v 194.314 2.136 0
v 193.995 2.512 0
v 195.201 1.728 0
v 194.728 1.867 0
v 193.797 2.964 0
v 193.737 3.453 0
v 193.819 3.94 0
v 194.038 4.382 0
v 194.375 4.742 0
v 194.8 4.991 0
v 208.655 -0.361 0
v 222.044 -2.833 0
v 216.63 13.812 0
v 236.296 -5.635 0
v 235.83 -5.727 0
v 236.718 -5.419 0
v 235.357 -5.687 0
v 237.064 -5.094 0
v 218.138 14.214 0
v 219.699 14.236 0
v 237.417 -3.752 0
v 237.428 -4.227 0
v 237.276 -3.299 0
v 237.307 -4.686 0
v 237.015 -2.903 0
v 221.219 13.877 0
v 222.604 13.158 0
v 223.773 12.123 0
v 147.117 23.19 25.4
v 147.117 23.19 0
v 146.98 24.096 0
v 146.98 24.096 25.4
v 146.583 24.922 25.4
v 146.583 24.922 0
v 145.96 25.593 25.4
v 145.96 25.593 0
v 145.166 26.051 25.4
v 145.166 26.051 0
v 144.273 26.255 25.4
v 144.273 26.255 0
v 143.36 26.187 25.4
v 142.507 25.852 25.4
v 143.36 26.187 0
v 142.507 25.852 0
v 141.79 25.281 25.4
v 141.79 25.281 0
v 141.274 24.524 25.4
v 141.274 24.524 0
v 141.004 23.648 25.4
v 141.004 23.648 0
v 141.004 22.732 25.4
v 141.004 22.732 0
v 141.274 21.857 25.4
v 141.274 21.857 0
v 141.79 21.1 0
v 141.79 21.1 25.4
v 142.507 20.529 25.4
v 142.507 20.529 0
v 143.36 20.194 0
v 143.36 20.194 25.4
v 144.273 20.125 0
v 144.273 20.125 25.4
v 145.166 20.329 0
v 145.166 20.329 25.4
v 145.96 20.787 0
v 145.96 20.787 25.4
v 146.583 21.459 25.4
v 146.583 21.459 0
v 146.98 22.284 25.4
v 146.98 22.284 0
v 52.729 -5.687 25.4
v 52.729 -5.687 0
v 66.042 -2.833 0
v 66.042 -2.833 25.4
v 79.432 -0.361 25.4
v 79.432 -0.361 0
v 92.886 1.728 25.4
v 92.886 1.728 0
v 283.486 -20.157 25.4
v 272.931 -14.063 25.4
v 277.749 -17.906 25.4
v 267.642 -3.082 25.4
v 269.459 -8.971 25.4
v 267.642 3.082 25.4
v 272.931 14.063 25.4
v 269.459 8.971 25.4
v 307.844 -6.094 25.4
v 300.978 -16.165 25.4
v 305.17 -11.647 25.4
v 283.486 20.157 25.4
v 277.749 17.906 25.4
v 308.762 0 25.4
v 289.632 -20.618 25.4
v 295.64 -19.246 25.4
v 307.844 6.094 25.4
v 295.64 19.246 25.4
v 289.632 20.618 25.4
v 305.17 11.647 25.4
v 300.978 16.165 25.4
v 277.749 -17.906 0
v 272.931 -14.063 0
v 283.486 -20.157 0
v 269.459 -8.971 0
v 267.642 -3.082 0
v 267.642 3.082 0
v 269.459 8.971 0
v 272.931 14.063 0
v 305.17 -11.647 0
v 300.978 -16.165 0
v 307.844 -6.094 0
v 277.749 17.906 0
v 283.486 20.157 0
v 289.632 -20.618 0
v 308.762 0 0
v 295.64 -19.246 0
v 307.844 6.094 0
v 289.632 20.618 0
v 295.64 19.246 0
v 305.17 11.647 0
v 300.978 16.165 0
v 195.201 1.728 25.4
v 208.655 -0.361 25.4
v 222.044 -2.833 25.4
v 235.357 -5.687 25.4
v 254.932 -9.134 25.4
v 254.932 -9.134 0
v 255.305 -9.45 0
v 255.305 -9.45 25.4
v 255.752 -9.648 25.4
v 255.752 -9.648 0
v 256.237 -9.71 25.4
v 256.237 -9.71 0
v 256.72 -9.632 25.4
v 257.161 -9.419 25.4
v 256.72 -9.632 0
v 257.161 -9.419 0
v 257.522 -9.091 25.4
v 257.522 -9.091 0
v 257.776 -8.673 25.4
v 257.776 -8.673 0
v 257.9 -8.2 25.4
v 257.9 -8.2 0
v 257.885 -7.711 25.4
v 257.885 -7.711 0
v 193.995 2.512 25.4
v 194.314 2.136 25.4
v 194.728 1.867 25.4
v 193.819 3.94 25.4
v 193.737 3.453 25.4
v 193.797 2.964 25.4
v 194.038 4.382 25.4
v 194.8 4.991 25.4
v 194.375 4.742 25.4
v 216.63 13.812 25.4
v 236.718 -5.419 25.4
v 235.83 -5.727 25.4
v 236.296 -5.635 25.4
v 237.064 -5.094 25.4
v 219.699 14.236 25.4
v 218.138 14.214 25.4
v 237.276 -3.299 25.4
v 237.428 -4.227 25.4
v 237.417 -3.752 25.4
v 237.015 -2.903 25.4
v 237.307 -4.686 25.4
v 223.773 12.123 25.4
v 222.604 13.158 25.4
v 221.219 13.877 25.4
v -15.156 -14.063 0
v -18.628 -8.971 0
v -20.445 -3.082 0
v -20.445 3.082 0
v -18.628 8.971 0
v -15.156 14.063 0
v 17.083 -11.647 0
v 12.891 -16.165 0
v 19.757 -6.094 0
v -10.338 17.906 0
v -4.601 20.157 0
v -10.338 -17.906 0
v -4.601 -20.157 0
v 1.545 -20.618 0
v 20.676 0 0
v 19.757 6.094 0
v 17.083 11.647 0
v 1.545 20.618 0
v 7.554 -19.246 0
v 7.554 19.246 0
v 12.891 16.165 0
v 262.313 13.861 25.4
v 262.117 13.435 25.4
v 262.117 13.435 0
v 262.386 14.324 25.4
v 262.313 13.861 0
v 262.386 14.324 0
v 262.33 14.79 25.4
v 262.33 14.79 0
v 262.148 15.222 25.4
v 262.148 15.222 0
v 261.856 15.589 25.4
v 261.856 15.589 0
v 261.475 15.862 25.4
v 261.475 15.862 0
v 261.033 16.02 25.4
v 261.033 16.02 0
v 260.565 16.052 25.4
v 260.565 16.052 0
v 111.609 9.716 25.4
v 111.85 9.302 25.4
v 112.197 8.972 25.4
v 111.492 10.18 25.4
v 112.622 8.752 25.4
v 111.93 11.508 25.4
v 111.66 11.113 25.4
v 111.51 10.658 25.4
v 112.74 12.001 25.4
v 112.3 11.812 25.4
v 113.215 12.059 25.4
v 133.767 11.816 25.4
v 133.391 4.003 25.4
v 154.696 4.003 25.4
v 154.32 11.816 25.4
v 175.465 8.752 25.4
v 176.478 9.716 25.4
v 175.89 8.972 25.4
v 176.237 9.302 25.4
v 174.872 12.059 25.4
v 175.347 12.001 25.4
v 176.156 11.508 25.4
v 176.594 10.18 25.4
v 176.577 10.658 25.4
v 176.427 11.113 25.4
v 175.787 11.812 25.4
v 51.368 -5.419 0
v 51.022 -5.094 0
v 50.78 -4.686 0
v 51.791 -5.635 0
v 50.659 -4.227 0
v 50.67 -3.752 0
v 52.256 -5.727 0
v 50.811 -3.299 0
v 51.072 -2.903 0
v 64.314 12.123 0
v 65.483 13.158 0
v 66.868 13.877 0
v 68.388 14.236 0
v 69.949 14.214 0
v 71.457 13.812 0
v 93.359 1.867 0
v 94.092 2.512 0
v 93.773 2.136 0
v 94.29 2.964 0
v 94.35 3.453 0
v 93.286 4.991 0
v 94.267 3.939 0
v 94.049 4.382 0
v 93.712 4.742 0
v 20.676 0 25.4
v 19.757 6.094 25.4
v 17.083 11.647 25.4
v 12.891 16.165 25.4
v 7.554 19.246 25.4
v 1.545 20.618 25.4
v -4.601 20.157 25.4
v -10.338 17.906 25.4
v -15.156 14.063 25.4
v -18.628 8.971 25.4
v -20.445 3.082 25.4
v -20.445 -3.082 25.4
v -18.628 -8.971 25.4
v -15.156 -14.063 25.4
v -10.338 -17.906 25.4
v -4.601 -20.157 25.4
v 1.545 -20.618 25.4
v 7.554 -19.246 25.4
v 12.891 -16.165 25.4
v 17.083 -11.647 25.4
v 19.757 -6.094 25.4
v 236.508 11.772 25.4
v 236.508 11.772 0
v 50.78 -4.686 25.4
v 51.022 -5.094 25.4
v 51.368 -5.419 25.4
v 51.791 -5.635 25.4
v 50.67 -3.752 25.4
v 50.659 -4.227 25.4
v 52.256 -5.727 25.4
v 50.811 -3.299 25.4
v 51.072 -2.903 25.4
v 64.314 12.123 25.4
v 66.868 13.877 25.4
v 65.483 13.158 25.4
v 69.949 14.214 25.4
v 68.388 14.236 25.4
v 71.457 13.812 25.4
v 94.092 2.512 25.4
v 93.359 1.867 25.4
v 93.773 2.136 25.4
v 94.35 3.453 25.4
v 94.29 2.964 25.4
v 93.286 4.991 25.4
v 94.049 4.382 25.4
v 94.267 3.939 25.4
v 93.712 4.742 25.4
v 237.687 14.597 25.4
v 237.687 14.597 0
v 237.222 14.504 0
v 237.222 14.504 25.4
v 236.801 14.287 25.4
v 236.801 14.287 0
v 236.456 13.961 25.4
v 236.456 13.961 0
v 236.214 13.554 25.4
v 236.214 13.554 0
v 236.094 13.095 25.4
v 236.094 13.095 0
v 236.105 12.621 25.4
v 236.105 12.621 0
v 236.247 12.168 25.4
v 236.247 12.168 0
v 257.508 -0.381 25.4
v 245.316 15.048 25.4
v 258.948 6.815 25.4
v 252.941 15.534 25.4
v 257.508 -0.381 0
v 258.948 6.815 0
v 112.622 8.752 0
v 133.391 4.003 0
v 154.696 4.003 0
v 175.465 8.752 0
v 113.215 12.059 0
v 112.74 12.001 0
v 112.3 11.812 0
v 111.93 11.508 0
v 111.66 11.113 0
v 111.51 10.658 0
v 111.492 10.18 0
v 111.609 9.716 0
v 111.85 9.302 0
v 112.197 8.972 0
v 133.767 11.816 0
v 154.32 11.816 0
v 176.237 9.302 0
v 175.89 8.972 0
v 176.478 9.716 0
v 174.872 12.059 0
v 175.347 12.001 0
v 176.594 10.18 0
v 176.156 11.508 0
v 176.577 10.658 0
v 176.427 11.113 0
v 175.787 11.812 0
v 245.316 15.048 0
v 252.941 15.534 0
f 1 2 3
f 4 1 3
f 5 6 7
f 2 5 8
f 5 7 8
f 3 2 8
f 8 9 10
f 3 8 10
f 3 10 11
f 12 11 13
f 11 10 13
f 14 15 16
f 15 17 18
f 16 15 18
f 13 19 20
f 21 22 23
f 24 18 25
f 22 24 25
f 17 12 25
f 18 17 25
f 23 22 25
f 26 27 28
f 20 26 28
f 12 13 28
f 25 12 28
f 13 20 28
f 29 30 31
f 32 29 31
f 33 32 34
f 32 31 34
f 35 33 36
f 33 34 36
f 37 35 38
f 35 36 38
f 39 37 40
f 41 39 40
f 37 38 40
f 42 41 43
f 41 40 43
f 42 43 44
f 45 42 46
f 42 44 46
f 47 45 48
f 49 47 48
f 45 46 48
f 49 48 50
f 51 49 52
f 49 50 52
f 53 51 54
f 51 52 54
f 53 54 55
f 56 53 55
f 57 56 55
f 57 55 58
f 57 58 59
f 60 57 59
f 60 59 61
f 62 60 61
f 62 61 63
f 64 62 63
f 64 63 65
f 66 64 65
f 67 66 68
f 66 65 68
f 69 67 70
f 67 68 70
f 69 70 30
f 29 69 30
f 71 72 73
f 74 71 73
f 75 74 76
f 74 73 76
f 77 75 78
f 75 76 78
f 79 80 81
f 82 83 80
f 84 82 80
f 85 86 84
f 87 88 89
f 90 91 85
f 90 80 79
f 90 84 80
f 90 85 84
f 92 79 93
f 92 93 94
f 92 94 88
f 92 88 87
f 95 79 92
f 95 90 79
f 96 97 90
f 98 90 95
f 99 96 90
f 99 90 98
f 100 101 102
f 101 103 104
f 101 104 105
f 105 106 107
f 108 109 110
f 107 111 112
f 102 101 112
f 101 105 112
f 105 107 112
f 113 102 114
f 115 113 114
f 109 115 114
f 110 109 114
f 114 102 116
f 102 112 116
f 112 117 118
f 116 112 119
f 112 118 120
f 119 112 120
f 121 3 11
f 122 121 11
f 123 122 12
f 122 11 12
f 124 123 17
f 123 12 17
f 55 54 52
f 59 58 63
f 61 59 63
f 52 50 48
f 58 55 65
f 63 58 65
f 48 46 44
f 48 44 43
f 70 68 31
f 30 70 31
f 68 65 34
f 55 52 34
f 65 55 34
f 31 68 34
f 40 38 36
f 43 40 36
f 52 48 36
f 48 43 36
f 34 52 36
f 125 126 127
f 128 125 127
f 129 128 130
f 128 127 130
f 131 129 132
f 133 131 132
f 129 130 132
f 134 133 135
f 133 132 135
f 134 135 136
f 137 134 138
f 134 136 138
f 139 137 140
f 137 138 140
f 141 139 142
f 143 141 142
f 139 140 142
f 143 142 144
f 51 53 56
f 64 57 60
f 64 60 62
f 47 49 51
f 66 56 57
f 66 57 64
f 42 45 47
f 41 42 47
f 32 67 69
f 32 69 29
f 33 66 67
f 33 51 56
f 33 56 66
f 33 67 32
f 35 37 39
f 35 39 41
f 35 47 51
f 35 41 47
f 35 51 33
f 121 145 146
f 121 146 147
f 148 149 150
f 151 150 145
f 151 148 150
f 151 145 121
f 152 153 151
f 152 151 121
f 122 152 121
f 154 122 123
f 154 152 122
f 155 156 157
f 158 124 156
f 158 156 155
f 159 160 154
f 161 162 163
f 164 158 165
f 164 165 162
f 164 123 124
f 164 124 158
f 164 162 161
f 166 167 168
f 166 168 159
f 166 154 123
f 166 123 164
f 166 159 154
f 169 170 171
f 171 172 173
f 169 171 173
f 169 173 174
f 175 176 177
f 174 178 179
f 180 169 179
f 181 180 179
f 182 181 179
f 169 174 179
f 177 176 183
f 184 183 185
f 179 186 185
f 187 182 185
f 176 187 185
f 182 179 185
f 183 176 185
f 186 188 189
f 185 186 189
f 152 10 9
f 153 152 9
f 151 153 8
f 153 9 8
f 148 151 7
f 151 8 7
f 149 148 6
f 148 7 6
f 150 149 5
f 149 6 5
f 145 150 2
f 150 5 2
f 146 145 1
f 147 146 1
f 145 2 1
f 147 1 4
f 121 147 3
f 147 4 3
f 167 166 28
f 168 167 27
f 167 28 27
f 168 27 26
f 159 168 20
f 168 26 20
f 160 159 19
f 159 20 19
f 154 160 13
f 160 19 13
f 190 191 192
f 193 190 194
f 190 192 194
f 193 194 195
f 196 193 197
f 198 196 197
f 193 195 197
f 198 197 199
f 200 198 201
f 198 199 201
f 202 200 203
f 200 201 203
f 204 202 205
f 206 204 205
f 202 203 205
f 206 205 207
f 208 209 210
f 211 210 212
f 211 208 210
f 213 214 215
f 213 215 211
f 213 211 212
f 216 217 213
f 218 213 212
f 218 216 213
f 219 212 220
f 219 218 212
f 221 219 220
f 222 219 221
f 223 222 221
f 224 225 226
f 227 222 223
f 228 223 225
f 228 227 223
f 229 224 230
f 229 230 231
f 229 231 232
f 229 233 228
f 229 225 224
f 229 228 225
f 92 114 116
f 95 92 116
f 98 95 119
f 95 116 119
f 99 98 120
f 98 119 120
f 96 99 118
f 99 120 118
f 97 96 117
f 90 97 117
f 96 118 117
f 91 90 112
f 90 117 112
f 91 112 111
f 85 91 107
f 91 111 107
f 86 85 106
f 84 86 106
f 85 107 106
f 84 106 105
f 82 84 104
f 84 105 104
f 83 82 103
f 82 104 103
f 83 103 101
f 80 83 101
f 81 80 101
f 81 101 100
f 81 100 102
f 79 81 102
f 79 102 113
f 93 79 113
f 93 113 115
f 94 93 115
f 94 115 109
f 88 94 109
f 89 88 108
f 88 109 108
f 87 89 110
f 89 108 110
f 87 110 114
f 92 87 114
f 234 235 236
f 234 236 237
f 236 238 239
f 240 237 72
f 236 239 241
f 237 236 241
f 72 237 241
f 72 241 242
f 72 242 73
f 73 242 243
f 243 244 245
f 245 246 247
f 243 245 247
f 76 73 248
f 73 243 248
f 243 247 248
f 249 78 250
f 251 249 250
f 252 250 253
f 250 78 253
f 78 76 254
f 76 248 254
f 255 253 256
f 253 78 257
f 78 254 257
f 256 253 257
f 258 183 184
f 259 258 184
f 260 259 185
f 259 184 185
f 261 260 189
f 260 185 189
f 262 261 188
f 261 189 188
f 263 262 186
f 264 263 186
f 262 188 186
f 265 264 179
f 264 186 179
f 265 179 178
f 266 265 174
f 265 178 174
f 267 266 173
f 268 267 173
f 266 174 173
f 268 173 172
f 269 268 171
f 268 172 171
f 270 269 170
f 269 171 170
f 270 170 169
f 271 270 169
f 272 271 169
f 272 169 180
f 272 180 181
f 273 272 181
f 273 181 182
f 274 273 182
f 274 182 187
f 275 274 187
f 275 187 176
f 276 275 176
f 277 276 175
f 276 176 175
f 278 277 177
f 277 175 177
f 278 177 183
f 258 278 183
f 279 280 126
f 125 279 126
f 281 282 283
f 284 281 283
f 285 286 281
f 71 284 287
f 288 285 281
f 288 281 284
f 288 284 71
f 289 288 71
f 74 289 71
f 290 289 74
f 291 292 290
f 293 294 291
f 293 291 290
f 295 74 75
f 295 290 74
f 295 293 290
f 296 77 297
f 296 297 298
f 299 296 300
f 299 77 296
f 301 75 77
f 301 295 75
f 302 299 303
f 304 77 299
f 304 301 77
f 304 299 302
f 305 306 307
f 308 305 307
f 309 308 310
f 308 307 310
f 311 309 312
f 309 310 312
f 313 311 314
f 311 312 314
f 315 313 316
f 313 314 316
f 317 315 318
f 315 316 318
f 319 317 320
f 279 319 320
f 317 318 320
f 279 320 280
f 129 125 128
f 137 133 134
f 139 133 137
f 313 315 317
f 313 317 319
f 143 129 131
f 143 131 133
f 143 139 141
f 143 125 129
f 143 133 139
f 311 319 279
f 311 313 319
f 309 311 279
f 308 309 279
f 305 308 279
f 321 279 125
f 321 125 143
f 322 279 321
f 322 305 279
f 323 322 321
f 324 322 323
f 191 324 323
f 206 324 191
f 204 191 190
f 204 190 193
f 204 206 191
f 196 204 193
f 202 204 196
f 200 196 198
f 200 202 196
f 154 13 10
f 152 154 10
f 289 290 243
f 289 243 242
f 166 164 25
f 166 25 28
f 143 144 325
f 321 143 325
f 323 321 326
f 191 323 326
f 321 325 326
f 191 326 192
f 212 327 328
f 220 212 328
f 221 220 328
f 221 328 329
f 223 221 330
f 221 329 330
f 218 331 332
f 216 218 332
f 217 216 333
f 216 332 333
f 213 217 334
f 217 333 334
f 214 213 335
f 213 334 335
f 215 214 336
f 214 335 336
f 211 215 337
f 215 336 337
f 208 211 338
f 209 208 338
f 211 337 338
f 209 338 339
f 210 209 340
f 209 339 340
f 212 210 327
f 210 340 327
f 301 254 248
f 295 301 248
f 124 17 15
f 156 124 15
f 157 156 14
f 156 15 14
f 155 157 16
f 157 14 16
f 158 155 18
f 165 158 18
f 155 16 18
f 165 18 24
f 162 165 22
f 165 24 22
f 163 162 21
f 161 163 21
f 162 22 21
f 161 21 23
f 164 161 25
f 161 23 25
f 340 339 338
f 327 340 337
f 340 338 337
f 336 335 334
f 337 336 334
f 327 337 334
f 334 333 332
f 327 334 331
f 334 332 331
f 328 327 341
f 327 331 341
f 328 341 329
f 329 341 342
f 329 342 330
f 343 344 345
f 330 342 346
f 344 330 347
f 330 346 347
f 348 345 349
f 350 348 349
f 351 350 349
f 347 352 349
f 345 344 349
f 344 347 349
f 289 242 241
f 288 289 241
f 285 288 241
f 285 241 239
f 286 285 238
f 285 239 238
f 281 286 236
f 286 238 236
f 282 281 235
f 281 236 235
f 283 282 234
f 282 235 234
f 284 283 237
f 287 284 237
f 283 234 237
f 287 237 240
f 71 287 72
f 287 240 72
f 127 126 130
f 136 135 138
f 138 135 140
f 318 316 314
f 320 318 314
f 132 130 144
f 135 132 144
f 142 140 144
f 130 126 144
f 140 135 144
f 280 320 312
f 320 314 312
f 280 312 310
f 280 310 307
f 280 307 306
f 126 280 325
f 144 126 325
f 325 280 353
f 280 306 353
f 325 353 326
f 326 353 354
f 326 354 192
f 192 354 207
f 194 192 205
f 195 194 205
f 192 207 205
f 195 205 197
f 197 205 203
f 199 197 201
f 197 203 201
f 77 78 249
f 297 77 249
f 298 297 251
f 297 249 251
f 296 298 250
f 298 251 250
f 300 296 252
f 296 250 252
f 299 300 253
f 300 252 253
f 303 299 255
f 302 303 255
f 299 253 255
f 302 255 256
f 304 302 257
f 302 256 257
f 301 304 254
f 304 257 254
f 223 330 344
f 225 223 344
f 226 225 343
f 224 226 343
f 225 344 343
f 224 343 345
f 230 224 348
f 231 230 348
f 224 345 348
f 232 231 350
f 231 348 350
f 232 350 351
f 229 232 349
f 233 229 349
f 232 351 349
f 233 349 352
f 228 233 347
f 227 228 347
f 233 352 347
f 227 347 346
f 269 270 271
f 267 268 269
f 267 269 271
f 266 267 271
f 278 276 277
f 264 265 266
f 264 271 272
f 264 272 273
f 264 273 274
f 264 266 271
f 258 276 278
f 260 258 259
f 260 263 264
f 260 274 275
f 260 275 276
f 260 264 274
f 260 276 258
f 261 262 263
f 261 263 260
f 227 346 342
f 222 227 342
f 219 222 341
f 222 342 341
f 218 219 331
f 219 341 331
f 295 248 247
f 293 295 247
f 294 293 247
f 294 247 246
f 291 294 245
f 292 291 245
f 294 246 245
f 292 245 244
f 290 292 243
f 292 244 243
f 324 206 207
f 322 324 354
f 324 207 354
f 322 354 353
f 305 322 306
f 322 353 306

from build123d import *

# Parameters (mm, degrees)
F0_R     = 20.6756
F1_DEPTH = 25.4
F0_R_2   = 3.0734


# Not quite as in the source:
# - ends of sketch curves that miss each other by under 0.0002 mm in the source are joined
# - a feature of the source that left no trace in its solid (it failed there, or was rolled back) is left out


with BuildPart() as f1:
    # F0 (on Top) → F1 (new body)
    with BuildSketch(Plane.XY):
        Circle(F0_R)
    extrude(amount=F1_DEPTH)


with BuildPart() as f1b:
    # F0 (on Top) → F1, piece 2 (new body)
    with BuildSketch(Plane.XY):
        with Locations((288.0868, 0)):
            Circle(F0_R)
    extrude(amount=F1_DEPTH)


with BuildPart() as f1c:
    # F0 (on Top) → F1, piece 3 (new body)
    with BuildSketch(Plane.XY):
        with BuildLine():
            Line((64.3141716, 12.1225818), (51.0722372, -2.9026612))
            ThreePointArc((51.0722372, -2.9026612), (50.886637197, -4.8983229131), (52.7293898046, -5.6865968893))
            ThreePointArc((52.7293898046, -5.6865968893), (72.7281380064, -1.5489138472), (92.885832563, 1.728361878))
            ThreePointArc((92.885832563, 1.728361878), (94.3380072647, 3.2062647833), (93.2864207732, 4.9914536905))
            Line((93.2864207732, 4.9914536905), (71.4569801787, 13.8116269873))
            ThreePointArc((71.4569801787, 13.8116269873), (67.6168206872, 14.1036419642), (64.3141716, 12.1225818))
        make_face()
    extrude(amount=F1_DEPTH)


with BuildPart() as f1d:
    # F0 (on Top) → F1, piece 4 (new body)
    with BuildSketch(Plane.XY):
        with BuildLine():
            ThreePointArc((235.3574089318, -5.6866037007), (237.2001615394, -4.8983297245), (237.0145615364, -2.9026680114))
            Line((237.0145615364, -2.9026680114), (223.7726271364, 12.1225749886))
            ThreePointArc((223.7726271364, 12.1225749886), (220.4699709207, 14.1036432413), (216.6298123513, 13.8116286368))
            Line((216.6298123513, 13.8116286368), (194.8003724, 4.9914556))
            ThreePointArc((194.8003724, 4.9914556), (193.7487857413, 3.2062666252), (195.2008776796, 1.7283753619))
            ThreePointArc((195.2008776796, 1.7283753619), (215.3585722363, -1.5489003634), (235.3574089318, -5.6866037007))
        make_face()
    extrude(amount=F1_DEPTH)


with BuildPart() as f1e:
    # F0 (on Top) → F1, piece 5 (new body)
    with BuildSketch(Plane.XY):
        with BuildLine():
            ThreePointArc((260.5652400713, 16.0522893388), (249.1287669286, 15.2867037282), (237.6874855708, 14.596689118))
            ThreePointArc((237.6874855708, 14.596689118), (236.2140385559, 13.5536732496), (236.5075745699, 11.7724475997))
            Line((236.5075745699, 11.7724475997), (254.9323832, -9.1336622))
            ThreePointArc((254.9323832, -9.1336622), (256.947957492, -9.5415132252), (257.8846881323, -7.7108254055))
            ThreePointArc((257.8846881323, -7.7108254055), (258.0038440306, 3.2617628688), (262.1165200814, 13.4351540637))
            ThreePointArc((262.1165200814, 13.4351540637), (262.1484797054, 15.2224111463), (260.5652400713, 16.0522893388))
        make_face()
    extrude(amount=F1_DEPTH)


with BuildPart() as f1f:
    # F0 (on Top) → F1, piece 6 (new body)
    with BuildSketch(Plane.XY):
        with BuildLine():
            ThreePointArc((174.8717102393, 12.0594991546), (144.0434, 11.7855877651), (113.2150897607, 12.0594991546))
            ThreePointArc((113.2150897607, 12.0594991546), (111.5097977558, 10.6584288913), (112.6218159145, 8.7520098426))
            ThreePointArc((112.6218159145, 8.7520098426), (144.0434, 3.403589621), (175.4649807504, 8.7520086732))
            ThreePointArc((175.4649807504, 8.7520086732), (176.5770022442, 10.6584288913), (174.8717102393, 12.0594991546))
        make_face()
    extrude(amount=F1_DEPTH)


with BuildPart() as f1g:
    # F0 (on Top) → F1, piece 7 (new body)
    with BuildSketch(Plane.XY):
        with Locations((144.0434, 23.1902)):
            Circle(F0_R_2)
    extrude(amount=F1_DEPTH)


solid = Compound([f1.part, f1b.part, f1c.part, f1d.part, f1e.part, f1f.part, f1g.part])
